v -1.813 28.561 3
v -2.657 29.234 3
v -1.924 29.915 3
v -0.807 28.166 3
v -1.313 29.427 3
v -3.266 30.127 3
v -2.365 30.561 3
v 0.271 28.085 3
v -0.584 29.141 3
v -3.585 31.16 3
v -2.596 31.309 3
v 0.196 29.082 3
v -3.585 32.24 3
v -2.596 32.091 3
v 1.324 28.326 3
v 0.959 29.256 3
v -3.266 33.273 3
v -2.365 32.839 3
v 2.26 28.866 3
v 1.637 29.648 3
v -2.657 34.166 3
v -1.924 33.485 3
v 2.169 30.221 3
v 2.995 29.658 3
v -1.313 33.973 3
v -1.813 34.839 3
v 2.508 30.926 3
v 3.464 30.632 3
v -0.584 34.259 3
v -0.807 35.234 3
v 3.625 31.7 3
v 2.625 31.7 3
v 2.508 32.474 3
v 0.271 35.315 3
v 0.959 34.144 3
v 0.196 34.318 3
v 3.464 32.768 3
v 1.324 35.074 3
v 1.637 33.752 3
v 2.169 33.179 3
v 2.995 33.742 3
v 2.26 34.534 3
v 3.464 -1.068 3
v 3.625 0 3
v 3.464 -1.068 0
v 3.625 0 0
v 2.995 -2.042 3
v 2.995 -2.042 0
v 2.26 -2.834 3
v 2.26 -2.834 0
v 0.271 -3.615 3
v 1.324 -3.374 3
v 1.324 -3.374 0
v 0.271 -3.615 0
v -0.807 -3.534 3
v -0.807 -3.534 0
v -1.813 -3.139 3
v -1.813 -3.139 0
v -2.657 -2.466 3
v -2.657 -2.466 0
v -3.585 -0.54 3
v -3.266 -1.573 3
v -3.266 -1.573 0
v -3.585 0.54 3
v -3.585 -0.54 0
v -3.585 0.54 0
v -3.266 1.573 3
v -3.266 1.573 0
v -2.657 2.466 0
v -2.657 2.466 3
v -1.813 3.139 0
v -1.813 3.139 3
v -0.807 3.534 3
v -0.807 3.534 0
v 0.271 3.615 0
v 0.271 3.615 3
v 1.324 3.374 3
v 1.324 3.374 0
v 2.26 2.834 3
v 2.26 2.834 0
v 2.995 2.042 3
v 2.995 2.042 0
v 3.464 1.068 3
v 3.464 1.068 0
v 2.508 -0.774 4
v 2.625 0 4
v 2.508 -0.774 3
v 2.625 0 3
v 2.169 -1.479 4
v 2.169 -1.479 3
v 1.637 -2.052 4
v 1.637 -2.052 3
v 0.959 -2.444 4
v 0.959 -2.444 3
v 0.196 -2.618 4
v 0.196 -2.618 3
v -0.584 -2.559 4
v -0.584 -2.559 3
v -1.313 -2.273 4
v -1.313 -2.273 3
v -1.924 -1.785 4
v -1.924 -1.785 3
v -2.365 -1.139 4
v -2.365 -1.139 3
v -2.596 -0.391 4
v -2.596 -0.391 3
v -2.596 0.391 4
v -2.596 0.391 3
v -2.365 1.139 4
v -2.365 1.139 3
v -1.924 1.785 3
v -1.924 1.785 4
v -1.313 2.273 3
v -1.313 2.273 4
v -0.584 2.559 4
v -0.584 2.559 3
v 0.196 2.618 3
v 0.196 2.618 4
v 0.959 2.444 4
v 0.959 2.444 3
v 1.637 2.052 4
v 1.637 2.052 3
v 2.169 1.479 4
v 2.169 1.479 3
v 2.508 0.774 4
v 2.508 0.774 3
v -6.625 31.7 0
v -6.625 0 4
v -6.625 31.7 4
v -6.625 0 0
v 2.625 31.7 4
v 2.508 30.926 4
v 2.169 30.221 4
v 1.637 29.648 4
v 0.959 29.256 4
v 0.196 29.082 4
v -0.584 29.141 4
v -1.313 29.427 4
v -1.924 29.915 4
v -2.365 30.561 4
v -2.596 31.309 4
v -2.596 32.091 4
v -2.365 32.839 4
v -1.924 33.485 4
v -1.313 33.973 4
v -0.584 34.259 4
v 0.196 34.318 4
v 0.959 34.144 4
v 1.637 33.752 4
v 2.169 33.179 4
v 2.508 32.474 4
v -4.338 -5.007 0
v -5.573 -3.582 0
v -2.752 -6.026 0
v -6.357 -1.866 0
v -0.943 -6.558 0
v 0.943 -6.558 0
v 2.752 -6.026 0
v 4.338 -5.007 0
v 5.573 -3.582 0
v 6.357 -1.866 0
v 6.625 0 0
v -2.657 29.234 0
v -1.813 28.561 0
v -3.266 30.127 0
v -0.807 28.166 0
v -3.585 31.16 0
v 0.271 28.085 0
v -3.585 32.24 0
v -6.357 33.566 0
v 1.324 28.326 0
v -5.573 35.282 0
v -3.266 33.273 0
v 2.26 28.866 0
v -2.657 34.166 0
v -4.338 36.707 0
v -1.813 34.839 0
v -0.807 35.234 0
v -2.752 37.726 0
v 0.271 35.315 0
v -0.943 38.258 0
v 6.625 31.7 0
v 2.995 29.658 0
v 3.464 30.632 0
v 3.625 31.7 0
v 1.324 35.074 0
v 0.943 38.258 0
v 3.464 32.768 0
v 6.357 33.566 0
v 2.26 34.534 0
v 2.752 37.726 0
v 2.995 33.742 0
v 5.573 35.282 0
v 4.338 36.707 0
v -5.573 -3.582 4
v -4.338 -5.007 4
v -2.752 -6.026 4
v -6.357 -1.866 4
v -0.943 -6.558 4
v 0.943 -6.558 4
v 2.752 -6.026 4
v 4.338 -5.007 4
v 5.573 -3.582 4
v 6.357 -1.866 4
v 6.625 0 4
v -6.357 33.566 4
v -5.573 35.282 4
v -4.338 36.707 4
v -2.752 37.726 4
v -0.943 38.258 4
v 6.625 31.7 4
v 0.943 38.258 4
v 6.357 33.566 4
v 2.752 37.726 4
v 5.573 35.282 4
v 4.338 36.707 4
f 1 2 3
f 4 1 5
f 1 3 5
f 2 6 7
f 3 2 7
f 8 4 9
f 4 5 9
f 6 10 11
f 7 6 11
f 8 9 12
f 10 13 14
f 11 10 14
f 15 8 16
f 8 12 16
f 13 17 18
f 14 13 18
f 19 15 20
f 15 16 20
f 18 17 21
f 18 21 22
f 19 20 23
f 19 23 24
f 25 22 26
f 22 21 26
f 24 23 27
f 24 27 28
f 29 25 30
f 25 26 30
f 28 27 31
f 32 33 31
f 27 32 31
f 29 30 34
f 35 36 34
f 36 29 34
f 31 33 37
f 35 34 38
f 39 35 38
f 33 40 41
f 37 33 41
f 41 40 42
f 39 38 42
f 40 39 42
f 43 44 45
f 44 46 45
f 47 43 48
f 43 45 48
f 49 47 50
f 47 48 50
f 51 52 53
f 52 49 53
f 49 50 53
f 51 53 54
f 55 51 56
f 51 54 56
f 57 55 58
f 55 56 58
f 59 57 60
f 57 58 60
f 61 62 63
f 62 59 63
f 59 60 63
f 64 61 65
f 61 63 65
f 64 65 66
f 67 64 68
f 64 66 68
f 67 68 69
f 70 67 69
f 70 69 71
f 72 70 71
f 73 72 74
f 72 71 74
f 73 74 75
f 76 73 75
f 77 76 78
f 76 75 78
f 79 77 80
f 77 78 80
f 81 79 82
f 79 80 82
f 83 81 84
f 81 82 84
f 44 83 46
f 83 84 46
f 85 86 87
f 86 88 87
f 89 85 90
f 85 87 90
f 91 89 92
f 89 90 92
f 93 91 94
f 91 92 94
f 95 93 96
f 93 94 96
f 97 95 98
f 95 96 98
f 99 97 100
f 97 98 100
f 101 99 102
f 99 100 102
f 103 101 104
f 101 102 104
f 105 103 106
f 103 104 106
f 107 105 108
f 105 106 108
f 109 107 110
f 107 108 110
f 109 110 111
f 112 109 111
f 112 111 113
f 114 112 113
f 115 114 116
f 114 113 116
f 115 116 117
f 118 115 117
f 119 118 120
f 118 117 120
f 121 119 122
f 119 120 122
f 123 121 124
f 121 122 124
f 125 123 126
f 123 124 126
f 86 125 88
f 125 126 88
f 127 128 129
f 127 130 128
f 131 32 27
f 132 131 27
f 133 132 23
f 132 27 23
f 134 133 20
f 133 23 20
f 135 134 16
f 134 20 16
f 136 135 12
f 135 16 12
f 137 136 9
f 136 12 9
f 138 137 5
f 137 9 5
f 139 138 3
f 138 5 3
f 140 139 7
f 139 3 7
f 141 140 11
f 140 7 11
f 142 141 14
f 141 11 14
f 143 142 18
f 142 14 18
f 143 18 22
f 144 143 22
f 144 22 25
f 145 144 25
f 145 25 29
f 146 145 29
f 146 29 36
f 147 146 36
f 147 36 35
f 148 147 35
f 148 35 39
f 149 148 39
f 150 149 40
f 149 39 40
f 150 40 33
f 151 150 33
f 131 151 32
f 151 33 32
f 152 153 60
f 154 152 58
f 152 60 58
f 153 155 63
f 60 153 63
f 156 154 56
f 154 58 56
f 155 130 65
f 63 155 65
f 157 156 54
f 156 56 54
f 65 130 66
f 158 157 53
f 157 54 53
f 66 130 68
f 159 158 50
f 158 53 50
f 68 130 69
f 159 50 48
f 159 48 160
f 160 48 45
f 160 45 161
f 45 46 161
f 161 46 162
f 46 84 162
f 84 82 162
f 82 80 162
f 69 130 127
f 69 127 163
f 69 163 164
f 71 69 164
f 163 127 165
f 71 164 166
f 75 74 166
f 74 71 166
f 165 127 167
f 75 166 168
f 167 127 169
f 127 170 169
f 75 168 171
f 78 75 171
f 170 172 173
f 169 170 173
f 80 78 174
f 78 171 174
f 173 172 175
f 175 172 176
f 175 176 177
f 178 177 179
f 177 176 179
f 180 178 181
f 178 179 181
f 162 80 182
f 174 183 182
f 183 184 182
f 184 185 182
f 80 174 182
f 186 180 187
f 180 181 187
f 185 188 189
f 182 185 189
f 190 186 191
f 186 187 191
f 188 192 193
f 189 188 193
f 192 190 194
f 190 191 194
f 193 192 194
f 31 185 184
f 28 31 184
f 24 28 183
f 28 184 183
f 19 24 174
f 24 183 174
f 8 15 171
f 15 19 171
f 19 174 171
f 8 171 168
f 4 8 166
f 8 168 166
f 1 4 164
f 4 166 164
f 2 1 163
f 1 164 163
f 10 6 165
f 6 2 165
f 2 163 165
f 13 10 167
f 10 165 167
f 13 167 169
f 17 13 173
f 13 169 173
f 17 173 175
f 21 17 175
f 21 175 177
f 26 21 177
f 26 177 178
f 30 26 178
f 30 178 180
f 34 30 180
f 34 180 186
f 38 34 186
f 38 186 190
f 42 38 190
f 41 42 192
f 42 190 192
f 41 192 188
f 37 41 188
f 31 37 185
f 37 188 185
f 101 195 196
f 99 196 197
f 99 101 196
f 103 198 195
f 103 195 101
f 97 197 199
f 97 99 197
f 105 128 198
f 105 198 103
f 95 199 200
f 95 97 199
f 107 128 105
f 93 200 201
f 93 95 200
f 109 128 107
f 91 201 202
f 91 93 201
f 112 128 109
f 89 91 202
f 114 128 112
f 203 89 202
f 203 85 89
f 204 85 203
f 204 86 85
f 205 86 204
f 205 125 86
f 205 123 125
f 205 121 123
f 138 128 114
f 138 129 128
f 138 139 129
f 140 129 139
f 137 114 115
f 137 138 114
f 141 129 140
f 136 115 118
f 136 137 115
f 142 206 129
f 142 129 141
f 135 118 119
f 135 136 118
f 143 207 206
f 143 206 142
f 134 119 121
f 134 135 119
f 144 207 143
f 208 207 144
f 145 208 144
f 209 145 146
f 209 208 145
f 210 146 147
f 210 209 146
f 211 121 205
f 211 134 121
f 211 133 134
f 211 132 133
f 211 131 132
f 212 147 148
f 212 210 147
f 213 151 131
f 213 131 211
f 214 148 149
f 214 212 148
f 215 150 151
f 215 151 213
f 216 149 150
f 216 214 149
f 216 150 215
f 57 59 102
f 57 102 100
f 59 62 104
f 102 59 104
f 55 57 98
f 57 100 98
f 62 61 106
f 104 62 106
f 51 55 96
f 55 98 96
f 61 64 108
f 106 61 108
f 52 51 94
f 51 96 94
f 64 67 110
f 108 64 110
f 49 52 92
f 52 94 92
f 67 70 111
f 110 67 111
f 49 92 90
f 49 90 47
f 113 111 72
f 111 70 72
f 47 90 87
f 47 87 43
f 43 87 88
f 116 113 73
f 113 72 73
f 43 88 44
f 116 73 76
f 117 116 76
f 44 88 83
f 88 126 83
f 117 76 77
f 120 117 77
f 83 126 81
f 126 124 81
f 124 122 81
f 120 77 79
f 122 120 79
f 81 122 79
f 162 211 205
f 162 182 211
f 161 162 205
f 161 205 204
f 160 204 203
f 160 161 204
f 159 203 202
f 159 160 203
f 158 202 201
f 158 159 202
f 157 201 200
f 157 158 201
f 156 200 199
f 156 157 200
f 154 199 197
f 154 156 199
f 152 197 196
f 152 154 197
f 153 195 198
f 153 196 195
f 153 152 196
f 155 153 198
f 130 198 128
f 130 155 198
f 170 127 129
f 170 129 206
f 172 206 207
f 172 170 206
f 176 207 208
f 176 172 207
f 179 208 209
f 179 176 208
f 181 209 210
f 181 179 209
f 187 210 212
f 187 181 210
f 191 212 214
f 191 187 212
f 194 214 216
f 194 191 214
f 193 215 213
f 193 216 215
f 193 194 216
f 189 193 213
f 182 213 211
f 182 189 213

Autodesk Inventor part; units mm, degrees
ref_plane "YZ Plane" through (0, 0, 0) normal (1, 0, 0) x (0, 1, 0)
ref_plane "XZ Plane" through (0, 0, 0) normal (0, 1, 0) x (-1, 0, 0)
ref_plane "XY Plane" through (0, 0, 0) normal (0, 0, 1) x (1, 0, 0)
sketch "Skizze1" plane through (0, 0, 0) normal (0, 0, 1) x (1, 0, 0)
  circle A0 centre (0, 0) radius 3.625
  line L0 (0, 47.315) -> (0, -15.615) construction
  line L1 (-9.275, 0) -> (9.275, 0) construction
  circle A1 centre (0, 31.7) radius 3.625
  line L2 (0, 31.7) -> (0, 0) construction
  line L3 (6.625, 31.7) -> (6.625, 0)
  line L4 (-6.625, 0) -> (-6.625, 31.7)
  arc A2 (6.625, 31.7) -> (-6.625, 31.7) centre (0, 31.7) ccw
  arc A3 (-6.625, 0) -> (6.625, 0) centre (0, 0) ccw
  circle A4 centre (0, 31.7) radius 2.625
  circle A5 centre (0, 0) radius 2.625
  point P0 (0, 15.85)
  dimension "d1" = 7.25
  dimension "d2" = 31.7
  dimension "d3" = 1
  dimension "d4" = 3
extrude "Extrusion1" add sketch "Skizze1" along normal blind 3 contours L3 A3 L4 A2
extrude "Extrusion2" add sketch "Skizze1" along normal blind 1 from surface at 3 contours A0 | A1 | L3 A3 L4 A2
properties part number "BeltDriveTestHolder"
